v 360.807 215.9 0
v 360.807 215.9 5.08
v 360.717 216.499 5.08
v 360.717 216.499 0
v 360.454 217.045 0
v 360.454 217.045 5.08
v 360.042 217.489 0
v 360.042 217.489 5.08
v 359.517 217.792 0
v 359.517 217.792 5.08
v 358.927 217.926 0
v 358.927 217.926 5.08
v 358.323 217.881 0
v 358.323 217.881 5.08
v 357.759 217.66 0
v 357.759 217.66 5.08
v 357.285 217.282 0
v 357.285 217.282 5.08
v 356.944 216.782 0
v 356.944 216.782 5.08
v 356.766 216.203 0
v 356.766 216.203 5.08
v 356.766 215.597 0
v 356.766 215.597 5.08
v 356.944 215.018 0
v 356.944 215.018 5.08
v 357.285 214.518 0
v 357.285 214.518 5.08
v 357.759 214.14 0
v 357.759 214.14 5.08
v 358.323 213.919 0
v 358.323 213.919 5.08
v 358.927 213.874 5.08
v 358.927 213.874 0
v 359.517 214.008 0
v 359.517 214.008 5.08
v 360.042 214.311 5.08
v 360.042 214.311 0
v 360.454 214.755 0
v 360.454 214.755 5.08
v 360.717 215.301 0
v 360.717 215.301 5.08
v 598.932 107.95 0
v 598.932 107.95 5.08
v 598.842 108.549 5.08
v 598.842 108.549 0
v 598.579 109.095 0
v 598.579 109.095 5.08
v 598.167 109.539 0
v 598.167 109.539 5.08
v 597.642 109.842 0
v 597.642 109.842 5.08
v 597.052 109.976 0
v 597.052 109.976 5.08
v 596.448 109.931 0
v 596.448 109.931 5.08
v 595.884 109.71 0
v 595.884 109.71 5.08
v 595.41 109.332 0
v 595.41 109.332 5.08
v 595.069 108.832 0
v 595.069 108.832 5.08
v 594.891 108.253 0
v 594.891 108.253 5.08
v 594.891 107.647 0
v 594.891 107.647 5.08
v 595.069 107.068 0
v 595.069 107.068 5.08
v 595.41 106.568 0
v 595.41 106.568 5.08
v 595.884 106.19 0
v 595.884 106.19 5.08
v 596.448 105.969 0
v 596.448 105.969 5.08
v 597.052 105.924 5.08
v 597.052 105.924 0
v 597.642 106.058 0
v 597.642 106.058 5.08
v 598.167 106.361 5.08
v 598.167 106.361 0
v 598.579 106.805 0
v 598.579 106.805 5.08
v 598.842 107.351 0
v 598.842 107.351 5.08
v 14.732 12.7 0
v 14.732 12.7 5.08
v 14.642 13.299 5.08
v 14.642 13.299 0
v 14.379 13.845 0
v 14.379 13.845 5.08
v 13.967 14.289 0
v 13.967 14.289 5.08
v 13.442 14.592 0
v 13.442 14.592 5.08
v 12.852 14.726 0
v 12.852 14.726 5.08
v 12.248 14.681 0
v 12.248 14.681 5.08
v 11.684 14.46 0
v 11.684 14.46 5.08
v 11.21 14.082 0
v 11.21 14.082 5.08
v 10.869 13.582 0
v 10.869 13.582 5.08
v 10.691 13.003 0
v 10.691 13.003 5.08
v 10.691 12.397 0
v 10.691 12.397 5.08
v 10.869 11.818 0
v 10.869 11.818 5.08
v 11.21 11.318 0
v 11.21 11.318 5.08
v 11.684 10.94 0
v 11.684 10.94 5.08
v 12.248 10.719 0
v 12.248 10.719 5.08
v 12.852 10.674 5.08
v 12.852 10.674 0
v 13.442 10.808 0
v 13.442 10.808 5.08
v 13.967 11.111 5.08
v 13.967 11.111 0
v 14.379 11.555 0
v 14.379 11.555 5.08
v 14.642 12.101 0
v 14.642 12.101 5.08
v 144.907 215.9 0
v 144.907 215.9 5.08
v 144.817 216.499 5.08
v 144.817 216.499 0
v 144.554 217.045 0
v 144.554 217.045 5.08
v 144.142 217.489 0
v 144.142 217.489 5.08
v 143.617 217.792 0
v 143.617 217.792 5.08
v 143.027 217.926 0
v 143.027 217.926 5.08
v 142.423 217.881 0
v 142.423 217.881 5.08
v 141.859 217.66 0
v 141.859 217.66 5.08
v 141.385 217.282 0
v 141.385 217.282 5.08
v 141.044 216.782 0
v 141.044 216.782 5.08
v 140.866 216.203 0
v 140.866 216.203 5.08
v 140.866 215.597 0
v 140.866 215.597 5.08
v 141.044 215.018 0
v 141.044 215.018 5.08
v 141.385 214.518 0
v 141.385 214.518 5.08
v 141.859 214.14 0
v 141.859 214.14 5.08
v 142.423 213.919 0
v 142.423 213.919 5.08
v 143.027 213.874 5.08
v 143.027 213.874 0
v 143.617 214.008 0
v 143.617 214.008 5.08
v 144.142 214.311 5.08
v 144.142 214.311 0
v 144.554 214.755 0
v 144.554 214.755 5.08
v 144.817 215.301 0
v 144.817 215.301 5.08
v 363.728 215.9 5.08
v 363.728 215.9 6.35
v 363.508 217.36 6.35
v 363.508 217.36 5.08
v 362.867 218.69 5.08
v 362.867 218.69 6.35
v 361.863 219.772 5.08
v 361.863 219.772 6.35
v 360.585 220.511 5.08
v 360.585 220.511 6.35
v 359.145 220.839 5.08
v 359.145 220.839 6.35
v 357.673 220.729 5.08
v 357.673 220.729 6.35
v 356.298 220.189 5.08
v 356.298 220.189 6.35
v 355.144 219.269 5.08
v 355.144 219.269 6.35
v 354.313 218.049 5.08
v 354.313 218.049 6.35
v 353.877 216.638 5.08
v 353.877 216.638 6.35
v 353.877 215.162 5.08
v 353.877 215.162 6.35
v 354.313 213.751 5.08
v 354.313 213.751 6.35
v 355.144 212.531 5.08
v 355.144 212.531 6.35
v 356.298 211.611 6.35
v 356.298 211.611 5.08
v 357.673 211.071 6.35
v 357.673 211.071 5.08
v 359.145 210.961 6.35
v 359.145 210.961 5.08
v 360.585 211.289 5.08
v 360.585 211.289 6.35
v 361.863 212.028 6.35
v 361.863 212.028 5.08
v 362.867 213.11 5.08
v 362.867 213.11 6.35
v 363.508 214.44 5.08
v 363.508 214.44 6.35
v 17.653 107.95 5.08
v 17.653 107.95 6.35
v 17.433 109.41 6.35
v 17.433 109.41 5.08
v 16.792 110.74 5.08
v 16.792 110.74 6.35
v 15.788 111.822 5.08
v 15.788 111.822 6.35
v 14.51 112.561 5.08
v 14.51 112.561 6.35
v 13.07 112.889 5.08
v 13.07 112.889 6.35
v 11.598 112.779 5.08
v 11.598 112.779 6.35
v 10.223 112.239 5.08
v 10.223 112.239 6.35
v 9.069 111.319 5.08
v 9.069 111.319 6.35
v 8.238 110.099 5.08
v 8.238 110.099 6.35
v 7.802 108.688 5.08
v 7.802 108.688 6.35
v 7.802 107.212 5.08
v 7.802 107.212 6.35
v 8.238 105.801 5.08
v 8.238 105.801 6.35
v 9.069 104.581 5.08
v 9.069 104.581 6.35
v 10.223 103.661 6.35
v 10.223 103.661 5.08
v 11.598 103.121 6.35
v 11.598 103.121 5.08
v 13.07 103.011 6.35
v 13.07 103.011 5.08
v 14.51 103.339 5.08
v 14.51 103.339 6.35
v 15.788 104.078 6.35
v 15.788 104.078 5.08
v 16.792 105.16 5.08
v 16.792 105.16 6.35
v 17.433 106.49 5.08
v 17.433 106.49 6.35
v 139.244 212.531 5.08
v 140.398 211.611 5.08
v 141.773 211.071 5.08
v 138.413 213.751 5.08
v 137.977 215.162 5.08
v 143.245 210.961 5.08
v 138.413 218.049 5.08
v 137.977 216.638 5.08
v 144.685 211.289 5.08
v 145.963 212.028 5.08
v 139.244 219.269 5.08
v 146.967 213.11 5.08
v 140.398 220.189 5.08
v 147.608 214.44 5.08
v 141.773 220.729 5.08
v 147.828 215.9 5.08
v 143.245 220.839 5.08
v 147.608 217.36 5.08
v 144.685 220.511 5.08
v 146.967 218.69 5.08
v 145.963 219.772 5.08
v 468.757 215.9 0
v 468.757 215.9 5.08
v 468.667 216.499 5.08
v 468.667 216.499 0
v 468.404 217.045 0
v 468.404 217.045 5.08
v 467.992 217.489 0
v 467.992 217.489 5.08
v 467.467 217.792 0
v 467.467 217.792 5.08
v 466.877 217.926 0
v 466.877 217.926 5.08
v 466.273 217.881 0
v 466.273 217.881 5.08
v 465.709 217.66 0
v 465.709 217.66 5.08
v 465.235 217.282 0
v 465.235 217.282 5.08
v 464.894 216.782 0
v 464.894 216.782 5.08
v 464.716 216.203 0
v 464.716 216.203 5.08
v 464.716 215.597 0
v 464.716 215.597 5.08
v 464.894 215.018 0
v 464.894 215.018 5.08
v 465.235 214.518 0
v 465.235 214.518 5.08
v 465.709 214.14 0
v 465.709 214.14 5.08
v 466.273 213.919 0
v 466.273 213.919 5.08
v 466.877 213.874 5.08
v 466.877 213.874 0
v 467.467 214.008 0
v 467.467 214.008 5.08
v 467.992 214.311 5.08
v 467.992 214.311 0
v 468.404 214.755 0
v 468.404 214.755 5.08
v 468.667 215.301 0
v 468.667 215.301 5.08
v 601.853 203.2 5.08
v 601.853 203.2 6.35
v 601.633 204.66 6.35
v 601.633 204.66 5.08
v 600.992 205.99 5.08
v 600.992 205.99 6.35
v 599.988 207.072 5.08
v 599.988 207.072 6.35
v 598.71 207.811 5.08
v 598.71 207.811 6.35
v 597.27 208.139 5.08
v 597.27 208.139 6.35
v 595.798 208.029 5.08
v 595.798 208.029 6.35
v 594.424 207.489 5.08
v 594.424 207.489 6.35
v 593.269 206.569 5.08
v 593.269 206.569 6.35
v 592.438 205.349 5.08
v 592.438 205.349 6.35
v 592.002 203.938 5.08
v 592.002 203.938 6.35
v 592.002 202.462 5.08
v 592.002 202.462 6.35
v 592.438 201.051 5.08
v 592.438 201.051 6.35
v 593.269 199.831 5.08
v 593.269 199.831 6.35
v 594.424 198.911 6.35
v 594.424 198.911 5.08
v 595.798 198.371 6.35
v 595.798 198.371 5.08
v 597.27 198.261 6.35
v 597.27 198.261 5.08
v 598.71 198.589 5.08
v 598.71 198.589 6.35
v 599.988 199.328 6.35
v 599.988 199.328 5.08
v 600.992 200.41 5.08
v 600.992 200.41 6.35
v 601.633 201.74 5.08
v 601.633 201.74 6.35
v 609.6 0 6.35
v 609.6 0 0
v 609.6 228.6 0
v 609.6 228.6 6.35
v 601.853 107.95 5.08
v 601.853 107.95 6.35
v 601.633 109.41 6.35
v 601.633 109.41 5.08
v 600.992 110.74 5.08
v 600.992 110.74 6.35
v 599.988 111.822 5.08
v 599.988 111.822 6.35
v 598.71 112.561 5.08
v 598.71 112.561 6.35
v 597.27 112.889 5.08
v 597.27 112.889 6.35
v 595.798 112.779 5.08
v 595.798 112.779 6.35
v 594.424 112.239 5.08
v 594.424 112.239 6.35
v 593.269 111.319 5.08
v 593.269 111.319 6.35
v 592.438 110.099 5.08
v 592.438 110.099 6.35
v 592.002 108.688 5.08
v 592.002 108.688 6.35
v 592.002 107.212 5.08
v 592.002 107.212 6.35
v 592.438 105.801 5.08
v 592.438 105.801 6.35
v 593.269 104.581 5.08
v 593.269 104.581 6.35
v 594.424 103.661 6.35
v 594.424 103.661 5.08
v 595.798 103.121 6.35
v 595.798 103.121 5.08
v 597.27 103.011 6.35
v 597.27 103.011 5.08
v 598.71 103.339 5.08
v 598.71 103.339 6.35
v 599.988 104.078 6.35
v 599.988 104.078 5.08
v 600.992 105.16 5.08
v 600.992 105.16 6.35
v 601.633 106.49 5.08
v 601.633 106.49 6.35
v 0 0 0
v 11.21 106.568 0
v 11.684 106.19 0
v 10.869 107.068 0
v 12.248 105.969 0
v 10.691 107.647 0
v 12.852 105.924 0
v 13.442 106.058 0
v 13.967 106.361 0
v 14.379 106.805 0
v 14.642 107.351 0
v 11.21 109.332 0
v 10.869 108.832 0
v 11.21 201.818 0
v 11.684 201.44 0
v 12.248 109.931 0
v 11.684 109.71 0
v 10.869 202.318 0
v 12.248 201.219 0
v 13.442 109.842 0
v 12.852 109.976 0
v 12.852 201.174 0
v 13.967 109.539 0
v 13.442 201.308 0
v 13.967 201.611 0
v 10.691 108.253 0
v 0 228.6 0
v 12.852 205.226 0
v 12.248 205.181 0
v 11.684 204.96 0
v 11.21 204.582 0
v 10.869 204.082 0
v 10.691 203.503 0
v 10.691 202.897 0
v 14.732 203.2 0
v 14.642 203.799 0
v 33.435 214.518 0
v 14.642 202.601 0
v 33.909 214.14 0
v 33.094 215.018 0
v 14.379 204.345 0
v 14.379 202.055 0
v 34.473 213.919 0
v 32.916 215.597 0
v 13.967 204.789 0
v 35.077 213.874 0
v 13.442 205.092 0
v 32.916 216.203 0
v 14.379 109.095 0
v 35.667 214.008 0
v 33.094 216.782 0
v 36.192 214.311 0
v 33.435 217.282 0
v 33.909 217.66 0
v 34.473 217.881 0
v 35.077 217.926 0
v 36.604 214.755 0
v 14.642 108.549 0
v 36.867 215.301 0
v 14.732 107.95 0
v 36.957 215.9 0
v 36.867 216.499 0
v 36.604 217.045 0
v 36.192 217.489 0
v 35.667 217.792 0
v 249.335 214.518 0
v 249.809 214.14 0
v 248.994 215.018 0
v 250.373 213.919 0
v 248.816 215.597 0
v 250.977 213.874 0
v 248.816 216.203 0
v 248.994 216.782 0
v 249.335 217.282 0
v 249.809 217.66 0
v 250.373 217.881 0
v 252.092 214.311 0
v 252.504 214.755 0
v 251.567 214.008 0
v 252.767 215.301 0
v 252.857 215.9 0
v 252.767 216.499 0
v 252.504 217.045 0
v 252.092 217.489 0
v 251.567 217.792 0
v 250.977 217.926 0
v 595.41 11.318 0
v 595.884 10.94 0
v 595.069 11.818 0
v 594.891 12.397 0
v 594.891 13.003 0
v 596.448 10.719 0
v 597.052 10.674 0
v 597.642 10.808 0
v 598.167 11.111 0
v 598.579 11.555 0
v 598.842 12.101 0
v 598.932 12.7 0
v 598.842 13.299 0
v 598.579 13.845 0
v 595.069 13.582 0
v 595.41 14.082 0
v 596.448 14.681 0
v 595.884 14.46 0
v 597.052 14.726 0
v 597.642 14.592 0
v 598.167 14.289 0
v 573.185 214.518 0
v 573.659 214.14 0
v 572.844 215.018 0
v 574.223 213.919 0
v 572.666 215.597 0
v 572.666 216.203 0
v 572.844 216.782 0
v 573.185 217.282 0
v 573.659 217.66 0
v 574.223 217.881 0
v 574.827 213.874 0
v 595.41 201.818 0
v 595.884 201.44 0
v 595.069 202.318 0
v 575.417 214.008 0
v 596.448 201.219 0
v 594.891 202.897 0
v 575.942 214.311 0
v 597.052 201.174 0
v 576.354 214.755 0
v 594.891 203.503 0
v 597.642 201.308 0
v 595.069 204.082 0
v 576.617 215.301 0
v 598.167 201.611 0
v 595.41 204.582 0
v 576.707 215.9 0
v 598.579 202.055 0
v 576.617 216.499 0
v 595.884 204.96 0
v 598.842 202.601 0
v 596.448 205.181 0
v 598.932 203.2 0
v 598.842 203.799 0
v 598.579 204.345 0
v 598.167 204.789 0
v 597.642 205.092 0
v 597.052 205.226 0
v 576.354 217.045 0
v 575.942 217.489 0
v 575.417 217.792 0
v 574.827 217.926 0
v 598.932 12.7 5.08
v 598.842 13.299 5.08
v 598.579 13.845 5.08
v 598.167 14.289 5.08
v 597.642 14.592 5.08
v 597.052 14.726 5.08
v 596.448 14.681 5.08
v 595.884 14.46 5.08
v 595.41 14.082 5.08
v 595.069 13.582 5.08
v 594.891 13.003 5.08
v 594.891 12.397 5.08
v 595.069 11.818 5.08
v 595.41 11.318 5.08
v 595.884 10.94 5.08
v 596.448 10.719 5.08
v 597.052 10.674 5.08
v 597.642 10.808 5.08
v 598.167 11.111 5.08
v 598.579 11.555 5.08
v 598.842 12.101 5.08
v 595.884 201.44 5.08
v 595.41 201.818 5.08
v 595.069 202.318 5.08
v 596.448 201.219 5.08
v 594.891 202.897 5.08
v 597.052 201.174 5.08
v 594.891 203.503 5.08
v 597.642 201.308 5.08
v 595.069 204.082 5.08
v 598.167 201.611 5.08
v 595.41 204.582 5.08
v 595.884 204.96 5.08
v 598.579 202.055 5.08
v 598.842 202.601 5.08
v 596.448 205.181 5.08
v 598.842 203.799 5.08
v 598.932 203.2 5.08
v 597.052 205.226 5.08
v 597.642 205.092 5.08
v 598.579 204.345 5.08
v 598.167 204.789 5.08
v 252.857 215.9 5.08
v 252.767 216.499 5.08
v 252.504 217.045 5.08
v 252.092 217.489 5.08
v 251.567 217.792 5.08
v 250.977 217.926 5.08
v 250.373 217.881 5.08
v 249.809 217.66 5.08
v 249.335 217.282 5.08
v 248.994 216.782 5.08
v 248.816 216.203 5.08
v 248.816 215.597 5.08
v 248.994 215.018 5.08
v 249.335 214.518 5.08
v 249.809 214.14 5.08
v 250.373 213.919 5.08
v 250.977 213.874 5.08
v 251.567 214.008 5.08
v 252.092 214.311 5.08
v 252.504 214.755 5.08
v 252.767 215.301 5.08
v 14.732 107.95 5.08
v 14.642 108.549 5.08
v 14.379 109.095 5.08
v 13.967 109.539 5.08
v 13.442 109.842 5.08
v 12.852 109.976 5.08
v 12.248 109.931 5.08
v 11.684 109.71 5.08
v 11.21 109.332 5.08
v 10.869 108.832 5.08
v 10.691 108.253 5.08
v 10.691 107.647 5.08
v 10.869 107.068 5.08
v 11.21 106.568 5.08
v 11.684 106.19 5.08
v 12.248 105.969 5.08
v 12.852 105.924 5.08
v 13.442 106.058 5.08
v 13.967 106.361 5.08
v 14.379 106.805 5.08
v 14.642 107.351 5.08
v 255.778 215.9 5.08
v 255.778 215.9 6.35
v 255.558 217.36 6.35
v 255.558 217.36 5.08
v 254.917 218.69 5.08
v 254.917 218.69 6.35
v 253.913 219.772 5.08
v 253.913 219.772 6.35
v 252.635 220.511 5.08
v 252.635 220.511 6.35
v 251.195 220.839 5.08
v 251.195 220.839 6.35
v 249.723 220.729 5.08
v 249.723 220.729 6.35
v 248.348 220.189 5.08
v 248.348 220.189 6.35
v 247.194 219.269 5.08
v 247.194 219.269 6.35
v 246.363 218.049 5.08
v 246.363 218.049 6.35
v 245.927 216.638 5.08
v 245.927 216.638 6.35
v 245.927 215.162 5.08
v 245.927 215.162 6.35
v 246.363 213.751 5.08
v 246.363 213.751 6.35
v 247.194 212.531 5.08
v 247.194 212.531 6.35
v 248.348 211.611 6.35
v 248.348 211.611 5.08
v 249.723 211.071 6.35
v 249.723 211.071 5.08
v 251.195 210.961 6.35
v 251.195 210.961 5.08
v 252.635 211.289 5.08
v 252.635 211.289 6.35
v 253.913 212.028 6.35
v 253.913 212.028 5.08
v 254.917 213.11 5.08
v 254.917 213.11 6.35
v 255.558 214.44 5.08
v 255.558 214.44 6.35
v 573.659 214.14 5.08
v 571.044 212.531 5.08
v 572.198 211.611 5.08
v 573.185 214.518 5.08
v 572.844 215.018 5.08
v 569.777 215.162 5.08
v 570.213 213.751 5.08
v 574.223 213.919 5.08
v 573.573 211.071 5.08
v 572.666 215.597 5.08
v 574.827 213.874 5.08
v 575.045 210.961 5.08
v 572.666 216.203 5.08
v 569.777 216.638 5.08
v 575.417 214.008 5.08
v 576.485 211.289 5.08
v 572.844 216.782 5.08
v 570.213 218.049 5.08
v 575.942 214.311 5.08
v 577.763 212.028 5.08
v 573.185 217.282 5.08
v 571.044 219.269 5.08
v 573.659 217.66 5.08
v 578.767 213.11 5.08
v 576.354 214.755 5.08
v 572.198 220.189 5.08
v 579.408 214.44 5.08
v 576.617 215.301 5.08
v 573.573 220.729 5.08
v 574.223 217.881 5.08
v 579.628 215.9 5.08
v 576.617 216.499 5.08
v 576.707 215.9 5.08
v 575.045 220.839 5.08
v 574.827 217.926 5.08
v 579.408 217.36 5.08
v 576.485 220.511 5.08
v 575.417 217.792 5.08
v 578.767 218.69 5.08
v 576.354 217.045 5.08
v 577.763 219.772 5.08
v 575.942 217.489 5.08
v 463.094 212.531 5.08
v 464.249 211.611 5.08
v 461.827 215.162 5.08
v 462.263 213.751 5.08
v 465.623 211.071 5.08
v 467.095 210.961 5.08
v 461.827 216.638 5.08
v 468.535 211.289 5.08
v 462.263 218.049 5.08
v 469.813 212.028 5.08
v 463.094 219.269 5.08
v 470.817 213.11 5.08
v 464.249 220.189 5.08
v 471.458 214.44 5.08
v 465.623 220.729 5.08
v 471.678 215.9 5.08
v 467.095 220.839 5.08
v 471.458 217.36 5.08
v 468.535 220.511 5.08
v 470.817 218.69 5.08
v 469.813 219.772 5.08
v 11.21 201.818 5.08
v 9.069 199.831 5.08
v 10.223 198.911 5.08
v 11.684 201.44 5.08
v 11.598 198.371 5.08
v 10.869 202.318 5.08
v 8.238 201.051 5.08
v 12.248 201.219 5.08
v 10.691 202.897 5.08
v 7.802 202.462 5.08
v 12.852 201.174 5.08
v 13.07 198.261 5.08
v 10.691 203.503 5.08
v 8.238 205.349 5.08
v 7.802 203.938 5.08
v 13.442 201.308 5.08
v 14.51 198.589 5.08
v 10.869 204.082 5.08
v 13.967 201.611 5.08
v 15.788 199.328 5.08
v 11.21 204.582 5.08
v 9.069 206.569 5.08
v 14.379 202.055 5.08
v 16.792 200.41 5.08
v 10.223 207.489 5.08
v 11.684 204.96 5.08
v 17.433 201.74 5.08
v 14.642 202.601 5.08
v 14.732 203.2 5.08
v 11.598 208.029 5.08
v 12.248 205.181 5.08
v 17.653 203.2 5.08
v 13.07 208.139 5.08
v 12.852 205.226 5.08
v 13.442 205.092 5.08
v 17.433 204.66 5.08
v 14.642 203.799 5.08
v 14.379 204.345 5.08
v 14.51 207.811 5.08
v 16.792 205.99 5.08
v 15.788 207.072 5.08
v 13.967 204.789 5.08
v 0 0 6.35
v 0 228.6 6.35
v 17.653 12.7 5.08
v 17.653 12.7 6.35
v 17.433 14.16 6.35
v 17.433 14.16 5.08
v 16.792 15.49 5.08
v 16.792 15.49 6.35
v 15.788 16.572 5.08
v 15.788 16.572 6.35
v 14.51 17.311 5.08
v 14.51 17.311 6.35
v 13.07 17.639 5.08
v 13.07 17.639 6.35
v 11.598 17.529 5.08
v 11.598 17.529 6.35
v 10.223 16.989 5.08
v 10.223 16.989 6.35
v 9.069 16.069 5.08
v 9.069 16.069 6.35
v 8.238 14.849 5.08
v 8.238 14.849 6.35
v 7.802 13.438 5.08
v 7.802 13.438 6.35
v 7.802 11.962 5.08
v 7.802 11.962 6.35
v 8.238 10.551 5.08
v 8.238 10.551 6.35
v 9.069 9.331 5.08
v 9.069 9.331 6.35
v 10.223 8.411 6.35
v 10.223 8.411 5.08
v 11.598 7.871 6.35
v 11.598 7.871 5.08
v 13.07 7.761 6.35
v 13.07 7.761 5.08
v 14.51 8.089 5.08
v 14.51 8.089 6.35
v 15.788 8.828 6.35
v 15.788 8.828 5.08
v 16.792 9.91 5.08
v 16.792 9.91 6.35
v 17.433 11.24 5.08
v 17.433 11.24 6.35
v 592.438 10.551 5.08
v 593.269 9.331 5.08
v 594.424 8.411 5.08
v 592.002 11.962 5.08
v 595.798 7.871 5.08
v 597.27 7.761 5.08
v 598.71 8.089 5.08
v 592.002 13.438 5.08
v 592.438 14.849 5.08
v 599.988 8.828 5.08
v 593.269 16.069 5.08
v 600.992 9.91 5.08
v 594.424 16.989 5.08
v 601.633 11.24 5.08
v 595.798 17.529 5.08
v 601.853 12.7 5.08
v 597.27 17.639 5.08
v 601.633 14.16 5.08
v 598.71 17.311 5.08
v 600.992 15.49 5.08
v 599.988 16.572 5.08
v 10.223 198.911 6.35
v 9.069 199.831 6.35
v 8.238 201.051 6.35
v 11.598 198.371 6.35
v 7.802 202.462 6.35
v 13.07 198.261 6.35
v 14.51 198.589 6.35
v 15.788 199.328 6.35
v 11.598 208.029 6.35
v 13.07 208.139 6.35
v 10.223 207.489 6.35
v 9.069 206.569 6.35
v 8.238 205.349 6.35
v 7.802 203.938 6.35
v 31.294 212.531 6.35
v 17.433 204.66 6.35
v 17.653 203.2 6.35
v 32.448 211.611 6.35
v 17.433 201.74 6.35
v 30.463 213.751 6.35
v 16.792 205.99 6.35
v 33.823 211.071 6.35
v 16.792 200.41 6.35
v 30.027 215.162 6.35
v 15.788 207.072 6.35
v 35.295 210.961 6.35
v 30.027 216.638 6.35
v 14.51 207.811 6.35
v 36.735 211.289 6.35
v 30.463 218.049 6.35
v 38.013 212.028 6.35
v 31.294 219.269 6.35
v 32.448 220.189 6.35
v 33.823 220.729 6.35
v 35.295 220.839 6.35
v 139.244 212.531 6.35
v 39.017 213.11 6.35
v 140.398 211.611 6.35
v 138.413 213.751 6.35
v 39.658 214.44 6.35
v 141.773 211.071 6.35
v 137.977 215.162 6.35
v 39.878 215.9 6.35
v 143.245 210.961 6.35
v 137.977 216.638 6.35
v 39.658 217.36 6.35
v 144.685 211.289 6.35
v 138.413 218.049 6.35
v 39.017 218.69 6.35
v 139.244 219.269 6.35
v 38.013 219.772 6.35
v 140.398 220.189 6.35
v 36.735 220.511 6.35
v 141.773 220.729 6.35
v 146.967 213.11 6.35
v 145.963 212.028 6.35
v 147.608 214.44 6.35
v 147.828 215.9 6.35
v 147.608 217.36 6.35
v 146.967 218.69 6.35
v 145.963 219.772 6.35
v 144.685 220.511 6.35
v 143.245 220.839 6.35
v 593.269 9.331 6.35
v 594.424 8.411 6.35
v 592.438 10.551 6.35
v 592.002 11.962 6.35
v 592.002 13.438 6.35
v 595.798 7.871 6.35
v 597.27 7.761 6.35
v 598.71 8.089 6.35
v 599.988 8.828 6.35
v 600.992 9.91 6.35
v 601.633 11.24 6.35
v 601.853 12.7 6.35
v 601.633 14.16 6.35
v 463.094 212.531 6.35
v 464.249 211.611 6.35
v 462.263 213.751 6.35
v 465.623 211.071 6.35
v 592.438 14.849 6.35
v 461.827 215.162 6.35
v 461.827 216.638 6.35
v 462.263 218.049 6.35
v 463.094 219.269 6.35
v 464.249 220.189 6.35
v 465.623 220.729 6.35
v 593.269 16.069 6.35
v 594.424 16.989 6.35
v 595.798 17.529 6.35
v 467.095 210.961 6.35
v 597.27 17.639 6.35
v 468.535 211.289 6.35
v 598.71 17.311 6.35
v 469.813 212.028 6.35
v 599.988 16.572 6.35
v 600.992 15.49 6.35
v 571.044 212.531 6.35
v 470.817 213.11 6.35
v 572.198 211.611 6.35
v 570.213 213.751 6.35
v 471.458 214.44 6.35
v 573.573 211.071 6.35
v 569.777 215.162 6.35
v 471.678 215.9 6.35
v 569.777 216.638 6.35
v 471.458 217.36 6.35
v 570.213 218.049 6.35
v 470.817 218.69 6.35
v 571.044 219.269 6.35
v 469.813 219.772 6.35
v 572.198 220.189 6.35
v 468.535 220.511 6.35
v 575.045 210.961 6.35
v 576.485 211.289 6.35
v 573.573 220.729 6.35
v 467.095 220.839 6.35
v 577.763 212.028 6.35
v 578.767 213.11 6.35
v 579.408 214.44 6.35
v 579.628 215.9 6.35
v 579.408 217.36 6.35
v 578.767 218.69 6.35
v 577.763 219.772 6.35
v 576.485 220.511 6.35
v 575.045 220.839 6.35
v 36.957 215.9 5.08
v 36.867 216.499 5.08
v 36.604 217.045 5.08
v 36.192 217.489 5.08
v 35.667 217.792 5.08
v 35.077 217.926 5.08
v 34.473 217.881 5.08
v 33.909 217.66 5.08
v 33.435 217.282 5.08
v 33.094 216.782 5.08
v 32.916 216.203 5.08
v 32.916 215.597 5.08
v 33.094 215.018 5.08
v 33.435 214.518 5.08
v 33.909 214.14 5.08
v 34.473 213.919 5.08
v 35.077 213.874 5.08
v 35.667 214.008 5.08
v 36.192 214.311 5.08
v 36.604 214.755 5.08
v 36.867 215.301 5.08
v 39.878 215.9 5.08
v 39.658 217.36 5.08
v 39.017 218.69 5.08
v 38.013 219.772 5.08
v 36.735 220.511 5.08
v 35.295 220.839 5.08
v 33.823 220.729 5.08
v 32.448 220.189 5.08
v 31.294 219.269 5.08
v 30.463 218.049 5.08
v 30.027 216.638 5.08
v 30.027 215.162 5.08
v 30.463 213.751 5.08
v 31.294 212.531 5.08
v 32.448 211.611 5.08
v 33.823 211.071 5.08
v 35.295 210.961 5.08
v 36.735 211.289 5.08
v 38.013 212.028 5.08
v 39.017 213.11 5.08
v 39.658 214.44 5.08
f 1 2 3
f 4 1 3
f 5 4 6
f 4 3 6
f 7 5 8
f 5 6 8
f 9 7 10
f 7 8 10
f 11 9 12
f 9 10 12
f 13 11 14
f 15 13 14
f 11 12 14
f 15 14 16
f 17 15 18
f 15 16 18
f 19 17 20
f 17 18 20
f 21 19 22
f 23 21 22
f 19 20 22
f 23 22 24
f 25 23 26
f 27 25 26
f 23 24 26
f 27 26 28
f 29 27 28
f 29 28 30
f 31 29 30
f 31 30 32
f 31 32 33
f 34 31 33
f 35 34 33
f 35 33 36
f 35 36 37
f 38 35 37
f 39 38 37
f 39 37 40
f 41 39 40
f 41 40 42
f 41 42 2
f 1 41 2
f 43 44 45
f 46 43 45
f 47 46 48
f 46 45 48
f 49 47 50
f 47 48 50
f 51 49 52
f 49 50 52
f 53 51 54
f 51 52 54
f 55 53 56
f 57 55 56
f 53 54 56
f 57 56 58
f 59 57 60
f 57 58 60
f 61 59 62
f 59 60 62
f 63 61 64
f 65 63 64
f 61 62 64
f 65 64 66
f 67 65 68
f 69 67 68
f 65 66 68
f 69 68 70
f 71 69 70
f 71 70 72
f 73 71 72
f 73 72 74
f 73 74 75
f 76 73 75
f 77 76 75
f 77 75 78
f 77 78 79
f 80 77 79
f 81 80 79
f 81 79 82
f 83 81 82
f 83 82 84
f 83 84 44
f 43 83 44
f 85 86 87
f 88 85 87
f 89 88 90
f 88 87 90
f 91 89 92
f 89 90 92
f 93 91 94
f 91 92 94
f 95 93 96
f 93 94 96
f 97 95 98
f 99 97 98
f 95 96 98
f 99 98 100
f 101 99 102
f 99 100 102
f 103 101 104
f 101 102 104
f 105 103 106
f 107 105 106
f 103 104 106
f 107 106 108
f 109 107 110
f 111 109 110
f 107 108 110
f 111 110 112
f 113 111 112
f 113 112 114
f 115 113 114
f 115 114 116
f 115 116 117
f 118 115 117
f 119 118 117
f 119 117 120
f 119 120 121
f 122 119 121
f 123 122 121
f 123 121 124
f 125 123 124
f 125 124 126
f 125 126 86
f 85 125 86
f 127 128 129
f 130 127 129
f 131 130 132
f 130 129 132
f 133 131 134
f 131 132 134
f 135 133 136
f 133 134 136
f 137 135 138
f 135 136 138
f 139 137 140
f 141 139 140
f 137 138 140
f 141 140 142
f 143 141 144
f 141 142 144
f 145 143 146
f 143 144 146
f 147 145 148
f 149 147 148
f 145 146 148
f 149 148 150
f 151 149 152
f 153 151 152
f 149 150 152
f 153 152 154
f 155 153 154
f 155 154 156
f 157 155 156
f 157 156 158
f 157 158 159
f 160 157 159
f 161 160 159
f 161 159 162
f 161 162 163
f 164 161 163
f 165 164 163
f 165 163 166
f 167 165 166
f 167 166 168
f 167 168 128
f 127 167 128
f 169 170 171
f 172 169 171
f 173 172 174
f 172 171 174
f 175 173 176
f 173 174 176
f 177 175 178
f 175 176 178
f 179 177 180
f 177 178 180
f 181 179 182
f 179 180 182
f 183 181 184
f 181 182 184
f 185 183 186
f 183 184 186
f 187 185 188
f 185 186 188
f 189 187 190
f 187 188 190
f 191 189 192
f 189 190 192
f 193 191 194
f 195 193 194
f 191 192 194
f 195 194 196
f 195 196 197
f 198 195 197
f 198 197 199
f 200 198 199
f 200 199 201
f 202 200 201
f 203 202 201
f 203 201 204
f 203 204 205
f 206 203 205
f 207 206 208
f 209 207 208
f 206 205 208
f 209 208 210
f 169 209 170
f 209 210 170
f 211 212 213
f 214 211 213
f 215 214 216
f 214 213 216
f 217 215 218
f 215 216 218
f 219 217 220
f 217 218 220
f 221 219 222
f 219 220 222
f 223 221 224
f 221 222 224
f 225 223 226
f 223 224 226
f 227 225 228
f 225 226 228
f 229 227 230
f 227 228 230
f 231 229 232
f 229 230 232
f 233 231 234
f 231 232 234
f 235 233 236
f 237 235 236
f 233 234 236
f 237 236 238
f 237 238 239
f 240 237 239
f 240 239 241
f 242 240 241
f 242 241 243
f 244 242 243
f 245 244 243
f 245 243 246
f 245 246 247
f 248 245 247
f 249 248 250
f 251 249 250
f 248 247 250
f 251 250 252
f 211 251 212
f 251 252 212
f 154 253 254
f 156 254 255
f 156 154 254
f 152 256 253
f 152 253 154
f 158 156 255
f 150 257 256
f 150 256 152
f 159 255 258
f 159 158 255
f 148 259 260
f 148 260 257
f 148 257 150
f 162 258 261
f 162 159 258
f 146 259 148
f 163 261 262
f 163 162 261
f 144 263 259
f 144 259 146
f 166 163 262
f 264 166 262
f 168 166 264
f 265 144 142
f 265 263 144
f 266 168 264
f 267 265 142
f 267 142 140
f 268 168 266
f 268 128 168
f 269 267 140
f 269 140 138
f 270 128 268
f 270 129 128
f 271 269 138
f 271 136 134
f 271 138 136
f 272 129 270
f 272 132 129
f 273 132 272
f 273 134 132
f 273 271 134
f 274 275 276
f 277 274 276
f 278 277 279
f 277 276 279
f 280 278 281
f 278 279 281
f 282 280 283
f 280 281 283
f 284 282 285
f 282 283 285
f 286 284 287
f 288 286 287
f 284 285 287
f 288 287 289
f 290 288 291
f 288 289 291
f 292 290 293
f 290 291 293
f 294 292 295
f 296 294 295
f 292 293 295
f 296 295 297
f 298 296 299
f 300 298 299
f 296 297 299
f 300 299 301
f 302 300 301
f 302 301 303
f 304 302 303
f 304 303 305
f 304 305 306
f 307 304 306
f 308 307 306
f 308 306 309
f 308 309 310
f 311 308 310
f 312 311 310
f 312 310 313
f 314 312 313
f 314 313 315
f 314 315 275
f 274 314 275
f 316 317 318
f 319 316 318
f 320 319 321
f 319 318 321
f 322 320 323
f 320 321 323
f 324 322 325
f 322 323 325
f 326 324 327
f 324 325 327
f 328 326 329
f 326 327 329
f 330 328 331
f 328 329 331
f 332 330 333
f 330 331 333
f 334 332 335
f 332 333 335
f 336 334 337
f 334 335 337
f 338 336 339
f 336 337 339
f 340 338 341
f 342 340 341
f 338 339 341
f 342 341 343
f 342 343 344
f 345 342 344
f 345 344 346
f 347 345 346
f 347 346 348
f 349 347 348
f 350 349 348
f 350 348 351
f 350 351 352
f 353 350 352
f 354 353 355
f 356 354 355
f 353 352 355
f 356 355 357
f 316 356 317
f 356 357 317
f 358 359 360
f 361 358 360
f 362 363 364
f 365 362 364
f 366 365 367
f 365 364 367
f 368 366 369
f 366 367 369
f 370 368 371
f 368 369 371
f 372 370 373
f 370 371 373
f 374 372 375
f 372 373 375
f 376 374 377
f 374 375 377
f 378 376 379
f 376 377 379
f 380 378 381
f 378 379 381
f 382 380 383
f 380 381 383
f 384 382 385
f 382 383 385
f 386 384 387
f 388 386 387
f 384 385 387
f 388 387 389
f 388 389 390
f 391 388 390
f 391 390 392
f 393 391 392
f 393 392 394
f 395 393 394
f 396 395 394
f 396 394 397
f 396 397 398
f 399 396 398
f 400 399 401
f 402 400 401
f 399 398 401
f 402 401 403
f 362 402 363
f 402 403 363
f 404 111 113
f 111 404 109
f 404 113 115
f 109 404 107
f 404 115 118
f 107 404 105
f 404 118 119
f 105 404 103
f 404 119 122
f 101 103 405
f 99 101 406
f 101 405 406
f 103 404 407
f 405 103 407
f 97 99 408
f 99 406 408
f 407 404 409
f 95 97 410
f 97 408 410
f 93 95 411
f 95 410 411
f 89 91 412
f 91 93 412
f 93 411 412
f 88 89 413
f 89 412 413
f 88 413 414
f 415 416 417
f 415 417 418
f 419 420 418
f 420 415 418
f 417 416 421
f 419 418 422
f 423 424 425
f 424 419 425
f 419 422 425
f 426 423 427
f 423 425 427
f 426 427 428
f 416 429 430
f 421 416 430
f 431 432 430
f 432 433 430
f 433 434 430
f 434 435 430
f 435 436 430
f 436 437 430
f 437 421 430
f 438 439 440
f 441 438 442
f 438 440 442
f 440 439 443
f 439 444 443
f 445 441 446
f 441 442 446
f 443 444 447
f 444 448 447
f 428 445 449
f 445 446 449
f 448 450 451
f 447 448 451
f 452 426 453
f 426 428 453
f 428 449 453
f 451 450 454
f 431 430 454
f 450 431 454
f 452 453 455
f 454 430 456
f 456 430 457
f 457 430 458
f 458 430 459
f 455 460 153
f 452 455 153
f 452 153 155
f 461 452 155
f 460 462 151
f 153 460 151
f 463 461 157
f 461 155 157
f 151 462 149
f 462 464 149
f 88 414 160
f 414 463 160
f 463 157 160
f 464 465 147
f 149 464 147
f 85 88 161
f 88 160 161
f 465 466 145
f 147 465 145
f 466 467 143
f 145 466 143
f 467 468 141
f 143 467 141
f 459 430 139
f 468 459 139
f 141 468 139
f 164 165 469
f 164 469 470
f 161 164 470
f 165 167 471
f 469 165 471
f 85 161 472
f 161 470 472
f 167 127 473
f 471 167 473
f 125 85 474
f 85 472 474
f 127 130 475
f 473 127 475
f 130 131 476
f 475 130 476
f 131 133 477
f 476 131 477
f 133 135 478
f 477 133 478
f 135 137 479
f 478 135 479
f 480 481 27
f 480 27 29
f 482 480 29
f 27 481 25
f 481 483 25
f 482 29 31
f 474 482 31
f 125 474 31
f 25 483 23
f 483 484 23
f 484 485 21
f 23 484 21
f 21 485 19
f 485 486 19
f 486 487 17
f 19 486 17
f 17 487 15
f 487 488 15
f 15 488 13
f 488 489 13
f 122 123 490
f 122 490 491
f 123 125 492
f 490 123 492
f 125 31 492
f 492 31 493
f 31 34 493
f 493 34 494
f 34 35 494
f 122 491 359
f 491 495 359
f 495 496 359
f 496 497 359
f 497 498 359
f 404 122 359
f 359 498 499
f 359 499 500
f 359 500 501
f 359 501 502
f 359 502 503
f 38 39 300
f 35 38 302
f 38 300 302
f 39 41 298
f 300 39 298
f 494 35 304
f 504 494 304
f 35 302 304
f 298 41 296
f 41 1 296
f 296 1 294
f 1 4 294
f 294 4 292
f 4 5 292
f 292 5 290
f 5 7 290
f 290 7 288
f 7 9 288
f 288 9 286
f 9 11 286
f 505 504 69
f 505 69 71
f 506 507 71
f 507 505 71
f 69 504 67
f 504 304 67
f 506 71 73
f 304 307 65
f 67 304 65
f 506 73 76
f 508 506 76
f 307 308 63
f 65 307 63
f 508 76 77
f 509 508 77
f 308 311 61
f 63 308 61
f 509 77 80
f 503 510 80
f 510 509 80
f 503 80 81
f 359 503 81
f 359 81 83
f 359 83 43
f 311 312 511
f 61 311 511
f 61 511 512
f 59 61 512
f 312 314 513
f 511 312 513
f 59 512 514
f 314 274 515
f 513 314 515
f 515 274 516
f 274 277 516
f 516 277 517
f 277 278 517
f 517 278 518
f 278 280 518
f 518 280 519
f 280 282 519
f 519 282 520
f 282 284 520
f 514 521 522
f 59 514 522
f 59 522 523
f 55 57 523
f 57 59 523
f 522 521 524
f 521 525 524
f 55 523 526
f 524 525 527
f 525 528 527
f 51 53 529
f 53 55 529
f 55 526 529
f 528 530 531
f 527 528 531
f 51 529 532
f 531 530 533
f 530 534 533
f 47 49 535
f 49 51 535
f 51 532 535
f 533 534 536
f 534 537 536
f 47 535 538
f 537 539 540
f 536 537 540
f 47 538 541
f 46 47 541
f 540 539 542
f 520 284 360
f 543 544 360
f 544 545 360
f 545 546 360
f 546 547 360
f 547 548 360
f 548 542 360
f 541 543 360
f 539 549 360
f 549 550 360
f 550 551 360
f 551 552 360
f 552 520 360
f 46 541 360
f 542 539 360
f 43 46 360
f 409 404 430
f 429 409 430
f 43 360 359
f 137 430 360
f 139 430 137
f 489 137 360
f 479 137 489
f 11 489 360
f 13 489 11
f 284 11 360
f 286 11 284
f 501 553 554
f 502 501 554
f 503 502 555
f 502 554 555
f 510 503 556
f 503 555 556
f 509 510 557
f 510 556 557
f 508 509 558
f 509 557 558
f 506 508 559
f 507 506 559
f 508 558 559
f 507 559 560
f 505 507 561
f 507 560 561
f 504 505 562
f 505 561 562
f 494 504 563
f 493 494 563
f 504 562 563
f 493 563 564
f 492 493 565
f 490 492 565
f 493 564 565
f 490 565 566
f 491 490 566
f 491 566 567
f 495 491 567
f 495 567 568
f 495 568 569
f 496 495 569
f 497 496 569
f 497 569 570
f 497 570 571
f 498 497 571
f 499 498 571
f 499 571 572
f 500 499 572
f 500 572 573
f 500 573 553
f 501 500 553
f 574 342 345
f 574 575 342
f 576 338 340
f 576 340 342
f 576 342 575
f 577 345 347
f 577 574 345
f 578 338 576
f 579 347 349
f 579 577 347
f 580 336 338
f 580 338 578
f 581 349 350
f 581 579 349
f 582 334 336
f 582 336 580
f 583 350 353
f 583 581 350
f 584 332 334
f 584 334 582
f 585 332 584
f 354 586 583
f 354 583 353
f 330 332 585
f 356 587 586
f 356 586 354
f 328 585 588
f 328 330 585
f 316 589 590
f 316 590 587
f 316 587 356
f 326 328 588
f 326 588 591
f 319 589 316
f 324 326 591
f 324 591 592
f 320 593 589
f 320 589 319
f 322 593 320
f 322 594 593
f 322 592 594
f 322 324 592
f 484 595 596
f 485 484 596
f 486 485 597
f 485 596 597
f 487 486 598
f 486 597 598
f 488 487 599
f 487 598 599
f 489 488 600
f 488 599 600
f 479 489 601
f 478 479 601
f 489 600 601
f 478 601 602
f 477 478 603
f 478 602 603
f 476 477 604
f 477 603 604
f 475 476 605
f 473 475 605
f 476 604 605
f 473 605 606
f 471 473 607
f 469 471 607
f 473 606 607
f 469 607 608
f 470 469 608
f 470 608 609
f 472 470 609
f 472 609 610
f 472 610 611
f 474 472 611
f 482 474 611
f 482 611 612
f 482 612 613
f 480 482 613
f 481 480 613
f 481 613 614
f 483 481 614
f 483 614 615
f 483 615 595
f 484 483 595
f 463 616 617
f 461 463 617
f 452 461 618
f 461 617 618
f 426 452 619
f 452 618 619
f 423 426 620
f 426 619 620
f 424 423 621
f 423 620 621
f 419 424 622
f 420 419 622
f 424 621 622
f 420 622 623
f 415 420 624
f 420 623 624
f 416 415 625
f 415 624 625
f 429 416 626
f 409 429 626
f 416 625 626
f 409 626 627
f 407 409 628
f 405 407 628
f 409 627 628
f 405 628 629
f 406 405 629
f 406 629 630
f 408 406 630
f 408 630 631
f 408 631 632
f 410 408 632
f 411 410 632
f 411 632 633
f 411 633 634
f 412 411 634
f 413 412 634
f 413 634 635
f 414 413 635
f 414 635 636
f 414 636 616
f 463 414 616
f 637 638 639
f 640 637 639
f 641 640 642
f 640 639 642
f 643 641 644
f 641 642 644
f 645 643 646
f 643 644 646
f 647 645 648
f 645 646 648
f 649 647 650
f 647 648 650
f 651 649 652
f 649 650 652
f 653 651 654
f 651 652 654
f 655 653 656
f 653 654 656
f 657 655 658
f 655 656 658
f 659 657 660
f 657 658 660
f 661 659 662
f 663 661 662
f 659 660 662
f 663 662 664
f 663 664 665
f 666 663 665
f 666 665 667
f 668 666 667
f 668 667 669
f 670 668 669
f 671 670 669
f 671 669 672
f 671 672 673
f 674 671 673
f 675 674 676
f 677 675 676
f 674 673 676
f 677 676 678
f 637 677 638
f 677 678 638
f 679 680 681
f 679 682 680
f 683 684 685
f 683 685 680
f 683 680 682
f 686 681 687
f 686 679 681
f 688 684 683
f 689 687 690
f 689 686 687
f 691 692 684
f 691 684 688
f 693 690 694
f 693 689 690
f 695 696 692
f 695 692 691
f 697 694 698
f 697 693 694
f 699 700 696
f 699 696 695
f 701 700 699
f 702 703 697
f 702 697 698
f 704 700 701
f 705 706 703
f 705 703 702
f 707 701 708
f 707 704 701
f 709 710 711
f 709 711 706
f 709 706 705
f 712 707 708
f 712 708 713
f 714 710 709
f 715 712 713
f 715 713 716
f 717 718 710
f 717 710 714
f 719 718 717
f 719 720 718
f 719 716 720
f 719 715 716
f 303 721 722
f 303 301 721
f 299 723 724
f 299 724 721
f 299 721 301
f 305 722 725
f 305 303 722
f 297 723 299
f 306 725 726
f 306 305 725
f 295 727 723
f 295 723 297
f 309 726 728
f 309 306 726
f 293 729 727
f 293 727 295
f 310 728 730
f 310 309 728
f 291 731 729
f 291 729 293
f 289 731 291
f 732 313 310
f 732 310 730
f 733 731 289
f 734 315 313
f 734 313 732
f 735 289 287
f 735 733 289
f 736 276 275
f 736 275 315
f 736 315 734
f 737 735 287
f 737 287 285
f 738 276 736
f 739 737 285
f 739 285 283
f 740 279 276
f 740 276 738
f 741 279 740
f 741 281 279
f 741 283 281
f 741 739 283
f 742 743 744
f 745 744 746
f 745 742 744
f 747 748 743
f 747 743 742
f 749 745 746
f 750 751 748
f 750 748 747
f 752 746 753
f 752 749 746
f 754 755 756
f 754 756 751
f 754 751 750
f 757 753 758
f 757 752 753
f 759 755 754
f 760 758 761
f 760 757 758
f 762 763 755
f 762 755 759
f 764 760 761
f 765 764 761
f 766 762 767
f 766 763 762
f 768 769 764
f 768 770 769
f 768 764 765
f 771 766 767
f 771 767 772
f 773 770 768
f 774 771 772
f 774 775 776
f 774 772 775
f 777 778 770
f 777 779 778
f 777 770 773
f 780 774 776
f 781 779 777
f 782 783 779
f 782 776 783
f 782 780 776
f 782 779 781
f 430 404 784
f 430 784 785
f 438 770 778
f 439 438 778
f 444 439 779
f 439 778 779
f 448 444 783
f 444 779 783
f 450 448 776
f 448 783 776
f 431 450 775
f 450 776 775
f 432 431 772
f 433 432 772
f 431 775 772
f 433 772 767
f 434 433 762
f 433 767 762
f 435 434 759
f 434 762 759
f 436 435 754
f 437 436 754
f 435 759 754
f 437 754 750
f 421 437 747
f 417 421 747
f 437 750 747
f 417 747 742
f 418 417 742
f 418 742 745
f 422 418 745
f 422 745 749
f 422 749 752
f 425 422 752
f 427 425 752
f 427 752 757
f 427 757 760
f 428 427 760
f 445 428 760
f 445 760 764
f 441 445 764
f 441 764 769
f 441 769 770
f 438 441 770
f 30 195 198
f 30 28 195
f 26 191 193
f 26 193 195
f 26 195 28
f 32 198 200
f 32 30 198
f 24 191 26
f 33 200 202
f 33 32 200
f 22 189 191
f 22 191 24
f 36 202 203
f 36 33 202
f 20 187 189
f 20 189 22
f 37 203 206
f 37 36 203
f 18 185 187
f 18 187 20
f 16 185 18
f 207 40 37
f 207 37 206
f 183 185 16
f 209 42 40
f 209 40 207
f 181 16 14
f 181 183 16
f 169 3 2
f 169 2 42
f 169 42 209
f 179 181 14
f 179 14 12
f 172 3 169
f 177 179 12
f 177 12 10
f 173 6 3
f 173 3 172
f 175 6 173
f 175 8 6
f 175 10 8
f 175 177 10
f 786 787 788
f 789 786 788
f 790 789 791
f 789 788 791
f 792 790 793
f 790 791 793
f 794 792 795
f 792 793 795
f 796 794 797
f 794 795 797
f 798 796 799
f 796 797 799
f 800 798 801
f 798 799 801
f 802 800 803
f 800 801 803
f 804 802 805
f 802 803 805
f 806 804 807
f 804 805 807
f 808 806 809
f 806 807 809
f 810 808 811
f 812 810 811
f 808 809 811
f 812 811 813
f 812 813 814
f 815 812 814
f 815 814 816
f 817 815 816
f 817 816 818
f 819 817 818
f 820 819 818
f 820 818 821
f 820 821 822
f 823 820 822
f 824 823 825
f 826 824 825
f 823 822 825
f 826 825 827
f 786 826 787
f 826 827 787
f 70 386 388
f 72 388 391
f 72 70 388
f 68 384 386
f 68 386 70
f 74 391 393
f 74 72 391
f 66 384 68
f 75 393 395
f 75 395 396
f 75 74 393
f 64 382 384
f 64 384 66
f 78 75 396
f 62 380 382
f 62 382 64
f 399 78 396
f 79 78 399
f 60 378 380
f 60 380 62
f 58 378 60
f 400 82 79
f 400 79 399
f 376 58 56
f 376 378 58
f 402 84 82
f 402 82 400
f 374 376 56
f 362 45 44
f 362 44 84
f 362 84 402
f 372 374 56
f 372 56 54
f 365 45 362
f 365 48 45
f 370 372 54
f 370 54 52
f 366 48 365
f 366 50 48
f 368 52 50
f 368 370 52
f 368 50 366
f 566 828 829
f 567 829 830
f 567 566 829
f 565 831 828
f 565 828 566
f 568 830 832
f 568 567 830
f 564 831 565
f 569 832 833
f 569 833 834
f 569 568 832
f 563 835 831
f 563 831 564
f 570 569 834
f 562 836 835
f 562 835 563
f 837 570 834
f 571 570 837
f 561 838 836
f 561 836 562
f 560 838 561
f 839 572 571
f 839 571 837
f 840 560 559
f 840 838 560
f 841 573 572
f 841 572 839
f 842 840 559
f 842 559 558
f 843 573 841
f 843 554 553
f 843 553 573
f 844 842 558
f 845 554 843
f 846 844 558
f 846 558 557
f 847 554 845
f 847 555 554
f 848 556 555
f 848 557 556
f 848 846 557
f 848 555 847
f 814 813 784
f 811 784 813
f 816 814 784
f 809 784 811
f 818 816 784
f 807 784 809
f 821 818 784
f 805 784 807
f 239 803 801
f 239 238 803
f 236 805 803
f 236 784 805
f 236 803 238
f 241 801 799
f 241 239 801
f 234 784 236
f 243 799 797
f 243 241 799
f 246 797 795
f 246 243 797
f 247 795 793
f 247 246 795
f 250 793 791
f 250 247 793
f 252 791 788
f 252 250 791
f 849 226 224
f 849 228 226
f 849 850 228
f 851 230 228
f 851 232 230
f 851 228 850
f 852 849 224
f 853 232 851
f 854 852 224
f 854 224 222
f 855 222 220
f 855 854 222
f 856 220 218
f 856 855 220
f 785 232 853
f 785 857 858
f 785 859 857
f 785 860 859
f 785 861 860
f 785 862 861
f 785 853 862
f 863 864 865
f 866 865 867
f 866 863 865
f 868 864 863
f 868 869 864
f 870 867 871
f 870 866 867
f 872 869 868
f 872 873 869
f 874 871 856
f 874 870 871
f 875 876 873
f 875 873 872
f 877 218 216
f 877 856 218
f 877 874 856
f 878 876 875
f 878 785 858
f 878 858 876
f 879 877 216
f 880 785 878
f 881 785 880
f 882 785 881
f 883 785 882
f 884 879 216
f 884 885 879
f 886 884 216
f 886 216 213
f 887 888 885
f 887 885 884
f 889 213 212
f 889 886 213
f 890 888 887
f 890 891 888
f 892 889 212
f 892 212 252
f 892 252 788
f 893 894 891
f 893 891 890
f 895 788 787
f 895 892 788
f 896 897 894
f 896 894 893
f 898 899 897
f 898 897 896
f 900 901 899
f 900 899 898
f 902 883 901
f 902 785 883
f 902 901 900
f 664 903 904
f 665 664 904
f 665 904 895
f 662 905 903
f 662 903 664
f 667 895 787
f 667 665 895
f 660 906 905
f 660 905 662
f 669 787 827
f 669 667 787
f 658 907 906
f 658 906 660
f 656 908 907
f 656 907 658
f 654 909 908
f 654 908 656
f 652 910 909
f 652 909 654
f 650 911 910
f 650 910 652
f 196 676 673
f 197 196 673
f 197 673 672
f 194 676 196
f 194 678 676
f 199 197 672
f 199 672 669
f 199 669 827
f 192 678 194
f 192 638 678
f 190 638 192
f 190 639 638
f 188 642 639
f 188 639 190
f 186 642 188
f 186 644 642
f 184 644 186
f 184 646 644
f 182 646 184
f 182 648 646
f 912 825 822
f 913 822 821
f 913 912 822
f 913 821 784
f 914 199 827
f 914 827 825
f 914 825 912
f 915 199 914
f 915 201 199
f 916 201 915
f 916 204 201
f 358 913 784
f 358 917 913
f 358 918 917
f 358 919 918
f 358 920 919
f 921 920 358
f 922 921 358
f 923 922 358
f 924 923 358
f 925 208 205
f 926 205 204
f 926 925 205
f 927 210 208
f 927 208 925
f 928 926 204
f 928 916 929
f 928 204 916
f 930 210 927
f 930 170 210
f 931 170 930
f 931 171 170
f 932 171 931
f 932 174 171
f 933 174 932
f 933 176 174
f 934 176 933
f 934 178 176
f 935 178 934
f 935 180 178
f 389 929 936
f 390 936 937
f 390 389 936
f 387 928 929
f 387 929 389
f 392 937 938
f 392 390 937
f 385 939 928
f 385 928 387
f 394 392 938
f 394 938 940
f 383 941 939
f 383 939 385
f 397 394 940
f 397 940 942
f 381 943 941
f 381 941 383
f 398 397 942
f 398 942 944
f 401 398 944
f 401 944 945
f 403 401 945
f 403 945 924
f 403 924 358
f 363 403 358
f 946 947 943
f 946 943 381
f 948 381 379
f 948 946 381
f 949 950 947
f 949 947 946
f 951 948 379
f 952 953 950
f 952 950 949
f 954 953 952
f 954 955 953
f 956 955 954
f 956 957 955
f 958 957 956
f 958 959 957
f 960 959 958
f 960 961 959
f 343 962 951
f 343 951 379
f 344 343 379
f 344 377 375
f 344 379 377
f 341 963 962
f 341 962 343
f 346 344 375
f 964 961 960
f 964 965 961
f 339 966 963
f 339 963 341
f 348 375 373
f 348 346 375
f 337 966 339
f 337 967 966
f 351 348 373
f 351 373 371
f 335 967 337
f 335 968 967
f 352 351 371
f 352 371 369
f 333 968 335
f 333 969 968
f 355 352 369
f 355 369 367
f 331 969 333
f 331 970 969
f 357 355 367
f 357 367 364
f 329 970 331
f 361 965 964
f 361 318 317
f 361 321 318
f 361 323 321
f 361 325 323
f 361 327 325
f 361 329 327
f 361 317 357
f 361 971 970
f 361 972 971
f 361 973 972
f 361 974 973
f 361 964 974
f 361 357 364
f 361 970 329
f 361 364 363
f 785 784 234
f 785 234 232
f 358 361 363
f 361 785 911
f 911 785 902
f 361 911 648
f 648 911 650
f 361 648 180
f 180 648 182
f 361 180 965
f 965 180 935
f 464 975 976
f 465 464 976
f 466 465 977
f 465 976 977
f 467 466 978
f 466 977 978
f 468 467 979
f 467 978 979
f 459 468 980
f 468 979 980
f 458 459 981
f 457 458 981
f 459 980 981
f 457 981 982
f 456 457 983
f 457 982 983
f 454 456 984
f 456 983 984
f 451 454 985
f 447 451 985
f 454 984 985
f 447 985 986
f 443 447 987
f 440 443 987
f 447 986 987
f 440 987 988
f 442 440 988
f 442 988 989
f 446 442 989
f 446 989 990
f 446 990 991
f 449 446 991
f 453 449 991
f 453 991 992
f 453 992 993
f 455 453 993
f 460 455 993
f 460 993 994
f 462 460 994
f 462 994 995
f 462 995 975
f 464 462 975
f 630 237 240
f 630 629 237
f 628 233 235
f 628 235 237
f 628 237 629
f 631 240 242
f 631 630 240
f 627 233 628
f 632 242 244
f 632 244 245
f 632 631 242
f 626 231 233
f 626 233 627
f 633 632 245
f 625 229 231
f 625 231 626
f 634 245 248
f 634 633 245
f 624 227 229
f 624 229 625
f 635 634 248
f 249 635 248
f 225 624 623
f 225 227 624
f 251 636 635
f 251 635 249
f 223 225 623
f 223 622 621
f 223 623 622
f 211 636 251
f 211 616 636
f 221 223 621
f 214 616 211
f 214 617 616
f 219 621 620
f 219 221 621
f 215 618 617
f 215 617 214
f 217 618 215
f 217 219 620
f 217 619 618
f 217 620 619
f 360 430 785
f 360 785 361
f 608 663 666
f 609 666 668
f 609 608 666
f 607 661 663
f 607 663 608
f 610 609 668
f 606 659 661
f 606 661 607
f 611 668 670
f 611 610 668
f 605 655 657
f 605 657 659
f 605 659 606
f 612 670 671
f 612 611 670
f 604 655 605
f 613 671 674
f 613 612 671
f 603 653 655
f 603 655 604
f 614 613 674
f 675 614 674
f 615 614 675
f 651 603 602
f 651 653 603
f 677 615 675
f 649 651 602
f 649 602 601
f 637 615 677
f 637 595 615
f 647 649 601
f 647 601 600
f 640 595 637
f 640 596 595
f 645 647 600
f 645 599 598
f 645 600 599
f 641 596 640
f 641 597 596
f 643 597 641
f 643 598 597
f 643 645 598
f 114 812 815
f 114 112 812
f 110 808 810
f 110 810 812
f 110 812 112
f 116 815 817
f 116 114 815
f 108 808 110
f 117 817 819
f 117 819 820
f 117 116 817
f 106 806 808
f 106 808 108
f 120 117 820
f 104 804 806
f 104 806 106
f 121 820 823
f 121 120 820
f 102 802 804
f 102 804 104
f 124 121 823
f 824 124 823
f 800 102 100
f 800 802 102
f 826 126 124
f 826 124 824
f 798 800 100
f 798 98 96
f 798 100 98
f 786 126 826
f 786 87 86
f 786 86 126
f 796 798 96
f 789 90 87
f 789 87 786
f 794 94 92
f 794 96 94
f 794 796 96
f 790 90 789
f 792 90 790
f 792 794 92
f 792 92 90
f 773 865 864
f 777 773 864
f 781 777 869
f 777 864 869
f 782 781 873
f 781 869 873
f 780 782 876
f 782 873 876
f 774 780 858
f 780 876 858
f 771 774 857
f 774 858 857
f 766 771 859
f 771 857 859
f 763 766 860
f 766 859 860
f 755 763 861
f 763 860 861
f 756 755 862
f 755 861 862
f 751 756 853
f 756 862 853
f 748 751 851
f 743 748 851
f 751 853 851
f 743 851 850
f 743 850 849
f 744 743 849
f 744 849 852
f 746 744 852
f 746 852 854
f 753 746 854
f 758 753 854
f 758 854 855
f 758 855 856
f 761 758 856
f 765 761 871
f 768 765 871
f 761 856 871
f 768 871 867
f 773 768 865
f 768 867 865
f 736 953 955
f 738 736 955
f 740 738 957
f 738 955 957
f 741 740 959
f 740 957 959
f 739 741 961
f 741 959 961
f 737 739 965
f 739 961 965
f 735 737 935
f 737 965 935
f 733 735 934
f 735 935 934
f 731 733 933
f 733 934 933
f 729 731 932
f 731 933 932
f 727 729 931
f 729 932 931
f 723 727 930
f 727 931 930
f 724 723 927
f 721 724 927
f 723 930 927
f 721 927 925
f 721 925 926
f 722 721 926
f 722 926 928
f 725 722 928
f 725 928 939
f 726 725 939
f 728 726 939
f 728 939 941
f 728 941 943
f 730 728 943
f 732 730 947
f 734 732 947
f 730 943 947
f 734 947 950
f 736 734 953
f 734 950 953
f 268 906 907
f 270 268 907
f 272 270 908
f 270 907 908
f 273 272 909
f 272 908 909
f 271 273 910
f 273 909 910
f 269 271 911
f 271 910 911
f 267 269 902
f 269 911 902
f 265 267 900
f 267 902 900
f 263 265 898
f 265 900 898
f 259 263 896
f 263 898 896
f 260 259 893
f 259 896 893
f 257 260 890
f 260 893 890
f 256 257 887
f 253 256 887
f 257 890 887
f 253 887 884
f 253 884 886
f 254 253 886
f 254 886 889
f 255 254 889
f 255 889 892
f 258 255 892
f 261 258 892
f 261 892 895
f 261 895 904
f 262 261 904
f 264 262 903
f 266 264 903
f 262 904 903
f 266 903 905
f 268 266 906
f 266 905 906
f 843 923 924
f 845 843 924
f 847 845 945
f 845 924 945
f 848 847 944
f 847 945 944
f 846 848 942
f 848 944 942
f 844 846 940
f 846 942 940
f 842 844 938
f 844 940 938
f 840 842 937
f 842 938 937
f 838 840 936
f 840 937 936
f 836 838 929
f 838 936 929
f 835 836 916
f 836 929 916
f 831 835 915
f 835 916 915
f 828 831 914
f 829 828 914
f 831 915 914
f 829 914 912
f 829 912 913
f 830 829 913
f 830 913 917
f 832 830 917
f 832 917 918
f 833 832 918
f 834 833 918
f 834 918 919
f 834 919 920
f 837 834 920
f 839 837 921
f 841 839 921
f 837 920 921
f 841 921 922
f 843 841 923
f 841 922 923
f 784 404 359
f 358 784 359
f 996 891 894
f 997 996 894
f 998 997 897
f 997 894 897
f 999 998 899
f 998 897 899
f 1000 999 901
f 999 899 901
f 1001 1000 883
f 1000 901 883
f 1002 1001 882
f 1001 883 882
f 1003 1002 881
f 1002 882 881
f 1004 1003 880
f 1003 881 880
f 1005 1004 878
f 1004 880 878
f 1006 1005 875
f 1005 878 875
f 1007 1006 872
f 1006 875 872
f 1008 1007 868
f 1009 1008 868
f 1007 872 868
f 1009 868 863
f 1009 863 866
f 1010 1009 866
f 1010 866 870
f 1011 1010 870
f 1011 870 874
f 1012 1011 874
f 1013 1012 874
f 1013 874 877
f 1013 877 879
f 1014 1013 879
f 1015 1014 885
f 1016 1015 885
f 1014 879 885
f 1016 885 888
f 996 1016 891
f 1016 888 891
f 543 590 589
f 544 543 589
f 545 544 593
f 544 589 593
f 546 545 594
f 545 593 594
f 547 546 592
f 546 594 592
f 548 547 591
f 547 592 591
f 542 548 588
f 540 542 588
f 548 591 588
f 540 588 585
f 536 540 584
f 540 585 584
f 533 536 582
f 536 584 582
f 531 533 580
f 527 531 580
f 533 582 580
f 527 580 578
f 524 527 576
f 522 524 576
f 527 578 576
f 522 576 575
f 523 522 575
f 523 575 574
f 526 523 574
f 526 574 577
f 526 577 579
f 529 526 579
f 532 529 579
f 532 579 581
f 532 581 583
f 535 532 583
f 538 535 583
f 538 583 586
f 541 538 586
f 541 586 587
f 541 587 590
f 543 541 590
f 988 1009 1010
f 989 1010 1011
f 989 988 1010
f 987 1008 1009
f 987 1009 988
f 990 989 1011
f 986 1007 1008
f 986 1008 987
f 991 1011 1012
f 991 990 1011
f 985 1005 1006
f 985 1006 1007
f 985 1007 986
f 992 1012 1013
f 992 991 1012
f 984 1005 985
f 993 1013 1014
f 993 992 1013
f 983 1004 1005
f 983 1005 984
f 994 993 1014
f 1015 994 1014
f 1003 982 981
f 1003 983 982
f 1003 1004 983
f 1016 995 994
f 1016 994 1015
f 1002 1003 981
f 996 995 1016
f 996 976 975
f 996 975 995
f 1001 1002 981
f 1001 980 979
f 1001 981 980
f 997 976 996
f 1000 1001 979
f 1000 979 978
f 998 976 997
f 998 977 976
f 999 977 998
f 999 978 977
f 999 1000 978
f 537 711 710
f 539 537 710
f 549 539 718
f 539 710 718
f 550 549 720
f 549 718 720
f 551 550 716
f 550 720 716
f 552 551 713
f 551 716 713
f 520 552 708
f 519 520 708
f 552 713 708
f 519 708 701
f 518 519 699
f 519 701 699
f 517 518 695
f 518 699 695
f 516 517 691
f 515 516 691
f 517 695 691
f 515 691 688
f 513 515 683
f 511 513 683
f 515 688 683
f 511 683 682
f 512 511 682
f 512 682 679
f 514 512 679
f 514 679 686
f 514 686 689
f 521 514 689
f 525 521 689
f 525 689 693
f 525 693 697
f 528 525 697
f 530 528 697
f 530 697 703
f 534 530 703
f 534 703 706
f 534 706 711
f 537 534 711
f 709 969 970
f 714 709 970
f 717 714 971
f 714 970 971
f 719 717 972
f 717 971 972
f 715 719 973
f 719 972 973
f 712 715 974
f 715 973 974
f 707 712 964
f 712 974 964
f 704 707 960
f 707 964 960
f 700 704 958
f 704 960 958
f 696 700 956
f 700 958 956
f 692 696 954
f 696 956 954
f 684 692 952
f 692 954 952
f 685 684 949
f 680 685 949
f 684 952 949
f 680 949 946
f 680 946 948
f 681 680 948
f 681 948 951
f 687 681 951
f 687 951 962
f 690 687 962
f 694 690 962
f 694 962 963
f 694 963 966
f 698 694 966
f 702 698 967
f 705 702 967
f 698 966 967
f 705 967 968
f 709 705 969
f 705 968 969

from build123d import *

# Parameters (mm, degrees)
SKETCH1_W           = 609.6
SKETCH1_H           = 228.6
BOSS_EXTRUDE1_DEPTH = 6.35
SKETCH2_R           = 2.032
CUT_EXTRUDE4_DEPTH  = 7.35
SKETCH3_R           = 4.953
CUT_EXTRUDE6_DEPTH  = 1.27
SKETCH4_R           = 2.032
CUT_EXTRUDE7_DEPTH  = 7.35
SKETCH5_R           = 4.953
CUT_EXTRUDE8_DEPTH  = 1.27


with BuildPart() as part:
    # Sketch1 → Boss-Extrude1 (new body)
    with BuildSketch(Plane.XY):
        with Locations((304.8, 114.3)):
            Rectangle(SKETCH1_W, SKETCH1_H)
    extrude(amount=BOSS_EXTRUDE1_DEPTH)

    # Sketch2 → Cut-Extrude4 (cut, through all)
    with BuildSketch(Plane.XY.offset(6.35)):
        with Locations((12.7, 203.2)):
            Circle(SKETCH2_R)
        with Locations((12.7, 107.95)):
            Circle(SKETCH2_R)
        with Locations((12.7, 12.7)):
            Circle(SKETCH2_R)
        with Locations((596.9, 12.7)):
            Circle(SKETCH2_R)
        with Locations((596.9, 107.95)):
            Circle(SKETCH2_R)
        with Locations((596.9, 203.2)):
            Circle(SKETCH2_R)
    extrude(amount=-CUT_EXTRUDE4_DEPTH, mode=Mode.SUBTRACT)

    # Sketch3 → Cut-Extrude6 (cut)
    with BuildSketch(Plane.XY.offset(6.35)):
        with Locations((12.7, 203.2)):
            Circle(SKETCH3_R)
        with Locations((12.7, 107.95)):
            Circle(SKETCH3_R)
        with Locations((12.7, 12.7)):
            Circle(SKETCH3_R)
        with Locations((596.9, 12.7)):
            Circle(SKETCH3_R)
        with Locations((596.9, 107.95)):
            Circle(SKETCH3_R)
        with Locations((596.9, 203.2)):
            Circle(SKETCH3_R)
    extrude(amount=-CUT_EXTRUDE6_DEPTH, mode=Mode.SUBTRACT)

    # Sketch4 → Cut-Extrude7 (cut, through all)
    with BuildSketch(Plane.XY.offset(6.35)):
        with Locations((34.925, 215.9)):
            Circle(SKETCH4_R)
        with Locations((142.875, 215.9)):
            Circle(SKETCH4_R)
        with Locations((250.825, 215.9)):
            Circle(SKETCH4_R)
        with Locations((358.775, 215.9)):
            Circle(SKETCH4_R)
        with Locations((466.725, 215.9)):
            Circle(SKETCH4_R)
        with Locations((574.675, 215.9)):
            Circle(SKETCH4_R)
    extrude(amount=-CUT_EXTRUDE7_DEPTH, mode=Mode.SUBTRACT)

    # Sketch5 → Cut-Extrude8 (cut)
    with BuildSketch(Plane.XY.offset(6.35)):
        with Locations((34.925, 215.9)):
            Circle(SKETCH5_R)
        with Locations((142.875, 215.9)):
            Circle(SKETCH5_R)
        with Locations((250.825, 215.9)):
            Circle(SKETCH5_R)
        with Locations((358.775, 215.9)):
            Circle(SKETCH5_R)
        with Locations((466.725, 215.9)):
            Circle(SKETCH5_R)
        with Locations((574.675, 215.9)):
            Circle(SKETCH5_R)
    extrude(amount=-CUT_EXTRUDE8_DEPTH, mode=Mode.SUBTRACT)


solid = part.part
